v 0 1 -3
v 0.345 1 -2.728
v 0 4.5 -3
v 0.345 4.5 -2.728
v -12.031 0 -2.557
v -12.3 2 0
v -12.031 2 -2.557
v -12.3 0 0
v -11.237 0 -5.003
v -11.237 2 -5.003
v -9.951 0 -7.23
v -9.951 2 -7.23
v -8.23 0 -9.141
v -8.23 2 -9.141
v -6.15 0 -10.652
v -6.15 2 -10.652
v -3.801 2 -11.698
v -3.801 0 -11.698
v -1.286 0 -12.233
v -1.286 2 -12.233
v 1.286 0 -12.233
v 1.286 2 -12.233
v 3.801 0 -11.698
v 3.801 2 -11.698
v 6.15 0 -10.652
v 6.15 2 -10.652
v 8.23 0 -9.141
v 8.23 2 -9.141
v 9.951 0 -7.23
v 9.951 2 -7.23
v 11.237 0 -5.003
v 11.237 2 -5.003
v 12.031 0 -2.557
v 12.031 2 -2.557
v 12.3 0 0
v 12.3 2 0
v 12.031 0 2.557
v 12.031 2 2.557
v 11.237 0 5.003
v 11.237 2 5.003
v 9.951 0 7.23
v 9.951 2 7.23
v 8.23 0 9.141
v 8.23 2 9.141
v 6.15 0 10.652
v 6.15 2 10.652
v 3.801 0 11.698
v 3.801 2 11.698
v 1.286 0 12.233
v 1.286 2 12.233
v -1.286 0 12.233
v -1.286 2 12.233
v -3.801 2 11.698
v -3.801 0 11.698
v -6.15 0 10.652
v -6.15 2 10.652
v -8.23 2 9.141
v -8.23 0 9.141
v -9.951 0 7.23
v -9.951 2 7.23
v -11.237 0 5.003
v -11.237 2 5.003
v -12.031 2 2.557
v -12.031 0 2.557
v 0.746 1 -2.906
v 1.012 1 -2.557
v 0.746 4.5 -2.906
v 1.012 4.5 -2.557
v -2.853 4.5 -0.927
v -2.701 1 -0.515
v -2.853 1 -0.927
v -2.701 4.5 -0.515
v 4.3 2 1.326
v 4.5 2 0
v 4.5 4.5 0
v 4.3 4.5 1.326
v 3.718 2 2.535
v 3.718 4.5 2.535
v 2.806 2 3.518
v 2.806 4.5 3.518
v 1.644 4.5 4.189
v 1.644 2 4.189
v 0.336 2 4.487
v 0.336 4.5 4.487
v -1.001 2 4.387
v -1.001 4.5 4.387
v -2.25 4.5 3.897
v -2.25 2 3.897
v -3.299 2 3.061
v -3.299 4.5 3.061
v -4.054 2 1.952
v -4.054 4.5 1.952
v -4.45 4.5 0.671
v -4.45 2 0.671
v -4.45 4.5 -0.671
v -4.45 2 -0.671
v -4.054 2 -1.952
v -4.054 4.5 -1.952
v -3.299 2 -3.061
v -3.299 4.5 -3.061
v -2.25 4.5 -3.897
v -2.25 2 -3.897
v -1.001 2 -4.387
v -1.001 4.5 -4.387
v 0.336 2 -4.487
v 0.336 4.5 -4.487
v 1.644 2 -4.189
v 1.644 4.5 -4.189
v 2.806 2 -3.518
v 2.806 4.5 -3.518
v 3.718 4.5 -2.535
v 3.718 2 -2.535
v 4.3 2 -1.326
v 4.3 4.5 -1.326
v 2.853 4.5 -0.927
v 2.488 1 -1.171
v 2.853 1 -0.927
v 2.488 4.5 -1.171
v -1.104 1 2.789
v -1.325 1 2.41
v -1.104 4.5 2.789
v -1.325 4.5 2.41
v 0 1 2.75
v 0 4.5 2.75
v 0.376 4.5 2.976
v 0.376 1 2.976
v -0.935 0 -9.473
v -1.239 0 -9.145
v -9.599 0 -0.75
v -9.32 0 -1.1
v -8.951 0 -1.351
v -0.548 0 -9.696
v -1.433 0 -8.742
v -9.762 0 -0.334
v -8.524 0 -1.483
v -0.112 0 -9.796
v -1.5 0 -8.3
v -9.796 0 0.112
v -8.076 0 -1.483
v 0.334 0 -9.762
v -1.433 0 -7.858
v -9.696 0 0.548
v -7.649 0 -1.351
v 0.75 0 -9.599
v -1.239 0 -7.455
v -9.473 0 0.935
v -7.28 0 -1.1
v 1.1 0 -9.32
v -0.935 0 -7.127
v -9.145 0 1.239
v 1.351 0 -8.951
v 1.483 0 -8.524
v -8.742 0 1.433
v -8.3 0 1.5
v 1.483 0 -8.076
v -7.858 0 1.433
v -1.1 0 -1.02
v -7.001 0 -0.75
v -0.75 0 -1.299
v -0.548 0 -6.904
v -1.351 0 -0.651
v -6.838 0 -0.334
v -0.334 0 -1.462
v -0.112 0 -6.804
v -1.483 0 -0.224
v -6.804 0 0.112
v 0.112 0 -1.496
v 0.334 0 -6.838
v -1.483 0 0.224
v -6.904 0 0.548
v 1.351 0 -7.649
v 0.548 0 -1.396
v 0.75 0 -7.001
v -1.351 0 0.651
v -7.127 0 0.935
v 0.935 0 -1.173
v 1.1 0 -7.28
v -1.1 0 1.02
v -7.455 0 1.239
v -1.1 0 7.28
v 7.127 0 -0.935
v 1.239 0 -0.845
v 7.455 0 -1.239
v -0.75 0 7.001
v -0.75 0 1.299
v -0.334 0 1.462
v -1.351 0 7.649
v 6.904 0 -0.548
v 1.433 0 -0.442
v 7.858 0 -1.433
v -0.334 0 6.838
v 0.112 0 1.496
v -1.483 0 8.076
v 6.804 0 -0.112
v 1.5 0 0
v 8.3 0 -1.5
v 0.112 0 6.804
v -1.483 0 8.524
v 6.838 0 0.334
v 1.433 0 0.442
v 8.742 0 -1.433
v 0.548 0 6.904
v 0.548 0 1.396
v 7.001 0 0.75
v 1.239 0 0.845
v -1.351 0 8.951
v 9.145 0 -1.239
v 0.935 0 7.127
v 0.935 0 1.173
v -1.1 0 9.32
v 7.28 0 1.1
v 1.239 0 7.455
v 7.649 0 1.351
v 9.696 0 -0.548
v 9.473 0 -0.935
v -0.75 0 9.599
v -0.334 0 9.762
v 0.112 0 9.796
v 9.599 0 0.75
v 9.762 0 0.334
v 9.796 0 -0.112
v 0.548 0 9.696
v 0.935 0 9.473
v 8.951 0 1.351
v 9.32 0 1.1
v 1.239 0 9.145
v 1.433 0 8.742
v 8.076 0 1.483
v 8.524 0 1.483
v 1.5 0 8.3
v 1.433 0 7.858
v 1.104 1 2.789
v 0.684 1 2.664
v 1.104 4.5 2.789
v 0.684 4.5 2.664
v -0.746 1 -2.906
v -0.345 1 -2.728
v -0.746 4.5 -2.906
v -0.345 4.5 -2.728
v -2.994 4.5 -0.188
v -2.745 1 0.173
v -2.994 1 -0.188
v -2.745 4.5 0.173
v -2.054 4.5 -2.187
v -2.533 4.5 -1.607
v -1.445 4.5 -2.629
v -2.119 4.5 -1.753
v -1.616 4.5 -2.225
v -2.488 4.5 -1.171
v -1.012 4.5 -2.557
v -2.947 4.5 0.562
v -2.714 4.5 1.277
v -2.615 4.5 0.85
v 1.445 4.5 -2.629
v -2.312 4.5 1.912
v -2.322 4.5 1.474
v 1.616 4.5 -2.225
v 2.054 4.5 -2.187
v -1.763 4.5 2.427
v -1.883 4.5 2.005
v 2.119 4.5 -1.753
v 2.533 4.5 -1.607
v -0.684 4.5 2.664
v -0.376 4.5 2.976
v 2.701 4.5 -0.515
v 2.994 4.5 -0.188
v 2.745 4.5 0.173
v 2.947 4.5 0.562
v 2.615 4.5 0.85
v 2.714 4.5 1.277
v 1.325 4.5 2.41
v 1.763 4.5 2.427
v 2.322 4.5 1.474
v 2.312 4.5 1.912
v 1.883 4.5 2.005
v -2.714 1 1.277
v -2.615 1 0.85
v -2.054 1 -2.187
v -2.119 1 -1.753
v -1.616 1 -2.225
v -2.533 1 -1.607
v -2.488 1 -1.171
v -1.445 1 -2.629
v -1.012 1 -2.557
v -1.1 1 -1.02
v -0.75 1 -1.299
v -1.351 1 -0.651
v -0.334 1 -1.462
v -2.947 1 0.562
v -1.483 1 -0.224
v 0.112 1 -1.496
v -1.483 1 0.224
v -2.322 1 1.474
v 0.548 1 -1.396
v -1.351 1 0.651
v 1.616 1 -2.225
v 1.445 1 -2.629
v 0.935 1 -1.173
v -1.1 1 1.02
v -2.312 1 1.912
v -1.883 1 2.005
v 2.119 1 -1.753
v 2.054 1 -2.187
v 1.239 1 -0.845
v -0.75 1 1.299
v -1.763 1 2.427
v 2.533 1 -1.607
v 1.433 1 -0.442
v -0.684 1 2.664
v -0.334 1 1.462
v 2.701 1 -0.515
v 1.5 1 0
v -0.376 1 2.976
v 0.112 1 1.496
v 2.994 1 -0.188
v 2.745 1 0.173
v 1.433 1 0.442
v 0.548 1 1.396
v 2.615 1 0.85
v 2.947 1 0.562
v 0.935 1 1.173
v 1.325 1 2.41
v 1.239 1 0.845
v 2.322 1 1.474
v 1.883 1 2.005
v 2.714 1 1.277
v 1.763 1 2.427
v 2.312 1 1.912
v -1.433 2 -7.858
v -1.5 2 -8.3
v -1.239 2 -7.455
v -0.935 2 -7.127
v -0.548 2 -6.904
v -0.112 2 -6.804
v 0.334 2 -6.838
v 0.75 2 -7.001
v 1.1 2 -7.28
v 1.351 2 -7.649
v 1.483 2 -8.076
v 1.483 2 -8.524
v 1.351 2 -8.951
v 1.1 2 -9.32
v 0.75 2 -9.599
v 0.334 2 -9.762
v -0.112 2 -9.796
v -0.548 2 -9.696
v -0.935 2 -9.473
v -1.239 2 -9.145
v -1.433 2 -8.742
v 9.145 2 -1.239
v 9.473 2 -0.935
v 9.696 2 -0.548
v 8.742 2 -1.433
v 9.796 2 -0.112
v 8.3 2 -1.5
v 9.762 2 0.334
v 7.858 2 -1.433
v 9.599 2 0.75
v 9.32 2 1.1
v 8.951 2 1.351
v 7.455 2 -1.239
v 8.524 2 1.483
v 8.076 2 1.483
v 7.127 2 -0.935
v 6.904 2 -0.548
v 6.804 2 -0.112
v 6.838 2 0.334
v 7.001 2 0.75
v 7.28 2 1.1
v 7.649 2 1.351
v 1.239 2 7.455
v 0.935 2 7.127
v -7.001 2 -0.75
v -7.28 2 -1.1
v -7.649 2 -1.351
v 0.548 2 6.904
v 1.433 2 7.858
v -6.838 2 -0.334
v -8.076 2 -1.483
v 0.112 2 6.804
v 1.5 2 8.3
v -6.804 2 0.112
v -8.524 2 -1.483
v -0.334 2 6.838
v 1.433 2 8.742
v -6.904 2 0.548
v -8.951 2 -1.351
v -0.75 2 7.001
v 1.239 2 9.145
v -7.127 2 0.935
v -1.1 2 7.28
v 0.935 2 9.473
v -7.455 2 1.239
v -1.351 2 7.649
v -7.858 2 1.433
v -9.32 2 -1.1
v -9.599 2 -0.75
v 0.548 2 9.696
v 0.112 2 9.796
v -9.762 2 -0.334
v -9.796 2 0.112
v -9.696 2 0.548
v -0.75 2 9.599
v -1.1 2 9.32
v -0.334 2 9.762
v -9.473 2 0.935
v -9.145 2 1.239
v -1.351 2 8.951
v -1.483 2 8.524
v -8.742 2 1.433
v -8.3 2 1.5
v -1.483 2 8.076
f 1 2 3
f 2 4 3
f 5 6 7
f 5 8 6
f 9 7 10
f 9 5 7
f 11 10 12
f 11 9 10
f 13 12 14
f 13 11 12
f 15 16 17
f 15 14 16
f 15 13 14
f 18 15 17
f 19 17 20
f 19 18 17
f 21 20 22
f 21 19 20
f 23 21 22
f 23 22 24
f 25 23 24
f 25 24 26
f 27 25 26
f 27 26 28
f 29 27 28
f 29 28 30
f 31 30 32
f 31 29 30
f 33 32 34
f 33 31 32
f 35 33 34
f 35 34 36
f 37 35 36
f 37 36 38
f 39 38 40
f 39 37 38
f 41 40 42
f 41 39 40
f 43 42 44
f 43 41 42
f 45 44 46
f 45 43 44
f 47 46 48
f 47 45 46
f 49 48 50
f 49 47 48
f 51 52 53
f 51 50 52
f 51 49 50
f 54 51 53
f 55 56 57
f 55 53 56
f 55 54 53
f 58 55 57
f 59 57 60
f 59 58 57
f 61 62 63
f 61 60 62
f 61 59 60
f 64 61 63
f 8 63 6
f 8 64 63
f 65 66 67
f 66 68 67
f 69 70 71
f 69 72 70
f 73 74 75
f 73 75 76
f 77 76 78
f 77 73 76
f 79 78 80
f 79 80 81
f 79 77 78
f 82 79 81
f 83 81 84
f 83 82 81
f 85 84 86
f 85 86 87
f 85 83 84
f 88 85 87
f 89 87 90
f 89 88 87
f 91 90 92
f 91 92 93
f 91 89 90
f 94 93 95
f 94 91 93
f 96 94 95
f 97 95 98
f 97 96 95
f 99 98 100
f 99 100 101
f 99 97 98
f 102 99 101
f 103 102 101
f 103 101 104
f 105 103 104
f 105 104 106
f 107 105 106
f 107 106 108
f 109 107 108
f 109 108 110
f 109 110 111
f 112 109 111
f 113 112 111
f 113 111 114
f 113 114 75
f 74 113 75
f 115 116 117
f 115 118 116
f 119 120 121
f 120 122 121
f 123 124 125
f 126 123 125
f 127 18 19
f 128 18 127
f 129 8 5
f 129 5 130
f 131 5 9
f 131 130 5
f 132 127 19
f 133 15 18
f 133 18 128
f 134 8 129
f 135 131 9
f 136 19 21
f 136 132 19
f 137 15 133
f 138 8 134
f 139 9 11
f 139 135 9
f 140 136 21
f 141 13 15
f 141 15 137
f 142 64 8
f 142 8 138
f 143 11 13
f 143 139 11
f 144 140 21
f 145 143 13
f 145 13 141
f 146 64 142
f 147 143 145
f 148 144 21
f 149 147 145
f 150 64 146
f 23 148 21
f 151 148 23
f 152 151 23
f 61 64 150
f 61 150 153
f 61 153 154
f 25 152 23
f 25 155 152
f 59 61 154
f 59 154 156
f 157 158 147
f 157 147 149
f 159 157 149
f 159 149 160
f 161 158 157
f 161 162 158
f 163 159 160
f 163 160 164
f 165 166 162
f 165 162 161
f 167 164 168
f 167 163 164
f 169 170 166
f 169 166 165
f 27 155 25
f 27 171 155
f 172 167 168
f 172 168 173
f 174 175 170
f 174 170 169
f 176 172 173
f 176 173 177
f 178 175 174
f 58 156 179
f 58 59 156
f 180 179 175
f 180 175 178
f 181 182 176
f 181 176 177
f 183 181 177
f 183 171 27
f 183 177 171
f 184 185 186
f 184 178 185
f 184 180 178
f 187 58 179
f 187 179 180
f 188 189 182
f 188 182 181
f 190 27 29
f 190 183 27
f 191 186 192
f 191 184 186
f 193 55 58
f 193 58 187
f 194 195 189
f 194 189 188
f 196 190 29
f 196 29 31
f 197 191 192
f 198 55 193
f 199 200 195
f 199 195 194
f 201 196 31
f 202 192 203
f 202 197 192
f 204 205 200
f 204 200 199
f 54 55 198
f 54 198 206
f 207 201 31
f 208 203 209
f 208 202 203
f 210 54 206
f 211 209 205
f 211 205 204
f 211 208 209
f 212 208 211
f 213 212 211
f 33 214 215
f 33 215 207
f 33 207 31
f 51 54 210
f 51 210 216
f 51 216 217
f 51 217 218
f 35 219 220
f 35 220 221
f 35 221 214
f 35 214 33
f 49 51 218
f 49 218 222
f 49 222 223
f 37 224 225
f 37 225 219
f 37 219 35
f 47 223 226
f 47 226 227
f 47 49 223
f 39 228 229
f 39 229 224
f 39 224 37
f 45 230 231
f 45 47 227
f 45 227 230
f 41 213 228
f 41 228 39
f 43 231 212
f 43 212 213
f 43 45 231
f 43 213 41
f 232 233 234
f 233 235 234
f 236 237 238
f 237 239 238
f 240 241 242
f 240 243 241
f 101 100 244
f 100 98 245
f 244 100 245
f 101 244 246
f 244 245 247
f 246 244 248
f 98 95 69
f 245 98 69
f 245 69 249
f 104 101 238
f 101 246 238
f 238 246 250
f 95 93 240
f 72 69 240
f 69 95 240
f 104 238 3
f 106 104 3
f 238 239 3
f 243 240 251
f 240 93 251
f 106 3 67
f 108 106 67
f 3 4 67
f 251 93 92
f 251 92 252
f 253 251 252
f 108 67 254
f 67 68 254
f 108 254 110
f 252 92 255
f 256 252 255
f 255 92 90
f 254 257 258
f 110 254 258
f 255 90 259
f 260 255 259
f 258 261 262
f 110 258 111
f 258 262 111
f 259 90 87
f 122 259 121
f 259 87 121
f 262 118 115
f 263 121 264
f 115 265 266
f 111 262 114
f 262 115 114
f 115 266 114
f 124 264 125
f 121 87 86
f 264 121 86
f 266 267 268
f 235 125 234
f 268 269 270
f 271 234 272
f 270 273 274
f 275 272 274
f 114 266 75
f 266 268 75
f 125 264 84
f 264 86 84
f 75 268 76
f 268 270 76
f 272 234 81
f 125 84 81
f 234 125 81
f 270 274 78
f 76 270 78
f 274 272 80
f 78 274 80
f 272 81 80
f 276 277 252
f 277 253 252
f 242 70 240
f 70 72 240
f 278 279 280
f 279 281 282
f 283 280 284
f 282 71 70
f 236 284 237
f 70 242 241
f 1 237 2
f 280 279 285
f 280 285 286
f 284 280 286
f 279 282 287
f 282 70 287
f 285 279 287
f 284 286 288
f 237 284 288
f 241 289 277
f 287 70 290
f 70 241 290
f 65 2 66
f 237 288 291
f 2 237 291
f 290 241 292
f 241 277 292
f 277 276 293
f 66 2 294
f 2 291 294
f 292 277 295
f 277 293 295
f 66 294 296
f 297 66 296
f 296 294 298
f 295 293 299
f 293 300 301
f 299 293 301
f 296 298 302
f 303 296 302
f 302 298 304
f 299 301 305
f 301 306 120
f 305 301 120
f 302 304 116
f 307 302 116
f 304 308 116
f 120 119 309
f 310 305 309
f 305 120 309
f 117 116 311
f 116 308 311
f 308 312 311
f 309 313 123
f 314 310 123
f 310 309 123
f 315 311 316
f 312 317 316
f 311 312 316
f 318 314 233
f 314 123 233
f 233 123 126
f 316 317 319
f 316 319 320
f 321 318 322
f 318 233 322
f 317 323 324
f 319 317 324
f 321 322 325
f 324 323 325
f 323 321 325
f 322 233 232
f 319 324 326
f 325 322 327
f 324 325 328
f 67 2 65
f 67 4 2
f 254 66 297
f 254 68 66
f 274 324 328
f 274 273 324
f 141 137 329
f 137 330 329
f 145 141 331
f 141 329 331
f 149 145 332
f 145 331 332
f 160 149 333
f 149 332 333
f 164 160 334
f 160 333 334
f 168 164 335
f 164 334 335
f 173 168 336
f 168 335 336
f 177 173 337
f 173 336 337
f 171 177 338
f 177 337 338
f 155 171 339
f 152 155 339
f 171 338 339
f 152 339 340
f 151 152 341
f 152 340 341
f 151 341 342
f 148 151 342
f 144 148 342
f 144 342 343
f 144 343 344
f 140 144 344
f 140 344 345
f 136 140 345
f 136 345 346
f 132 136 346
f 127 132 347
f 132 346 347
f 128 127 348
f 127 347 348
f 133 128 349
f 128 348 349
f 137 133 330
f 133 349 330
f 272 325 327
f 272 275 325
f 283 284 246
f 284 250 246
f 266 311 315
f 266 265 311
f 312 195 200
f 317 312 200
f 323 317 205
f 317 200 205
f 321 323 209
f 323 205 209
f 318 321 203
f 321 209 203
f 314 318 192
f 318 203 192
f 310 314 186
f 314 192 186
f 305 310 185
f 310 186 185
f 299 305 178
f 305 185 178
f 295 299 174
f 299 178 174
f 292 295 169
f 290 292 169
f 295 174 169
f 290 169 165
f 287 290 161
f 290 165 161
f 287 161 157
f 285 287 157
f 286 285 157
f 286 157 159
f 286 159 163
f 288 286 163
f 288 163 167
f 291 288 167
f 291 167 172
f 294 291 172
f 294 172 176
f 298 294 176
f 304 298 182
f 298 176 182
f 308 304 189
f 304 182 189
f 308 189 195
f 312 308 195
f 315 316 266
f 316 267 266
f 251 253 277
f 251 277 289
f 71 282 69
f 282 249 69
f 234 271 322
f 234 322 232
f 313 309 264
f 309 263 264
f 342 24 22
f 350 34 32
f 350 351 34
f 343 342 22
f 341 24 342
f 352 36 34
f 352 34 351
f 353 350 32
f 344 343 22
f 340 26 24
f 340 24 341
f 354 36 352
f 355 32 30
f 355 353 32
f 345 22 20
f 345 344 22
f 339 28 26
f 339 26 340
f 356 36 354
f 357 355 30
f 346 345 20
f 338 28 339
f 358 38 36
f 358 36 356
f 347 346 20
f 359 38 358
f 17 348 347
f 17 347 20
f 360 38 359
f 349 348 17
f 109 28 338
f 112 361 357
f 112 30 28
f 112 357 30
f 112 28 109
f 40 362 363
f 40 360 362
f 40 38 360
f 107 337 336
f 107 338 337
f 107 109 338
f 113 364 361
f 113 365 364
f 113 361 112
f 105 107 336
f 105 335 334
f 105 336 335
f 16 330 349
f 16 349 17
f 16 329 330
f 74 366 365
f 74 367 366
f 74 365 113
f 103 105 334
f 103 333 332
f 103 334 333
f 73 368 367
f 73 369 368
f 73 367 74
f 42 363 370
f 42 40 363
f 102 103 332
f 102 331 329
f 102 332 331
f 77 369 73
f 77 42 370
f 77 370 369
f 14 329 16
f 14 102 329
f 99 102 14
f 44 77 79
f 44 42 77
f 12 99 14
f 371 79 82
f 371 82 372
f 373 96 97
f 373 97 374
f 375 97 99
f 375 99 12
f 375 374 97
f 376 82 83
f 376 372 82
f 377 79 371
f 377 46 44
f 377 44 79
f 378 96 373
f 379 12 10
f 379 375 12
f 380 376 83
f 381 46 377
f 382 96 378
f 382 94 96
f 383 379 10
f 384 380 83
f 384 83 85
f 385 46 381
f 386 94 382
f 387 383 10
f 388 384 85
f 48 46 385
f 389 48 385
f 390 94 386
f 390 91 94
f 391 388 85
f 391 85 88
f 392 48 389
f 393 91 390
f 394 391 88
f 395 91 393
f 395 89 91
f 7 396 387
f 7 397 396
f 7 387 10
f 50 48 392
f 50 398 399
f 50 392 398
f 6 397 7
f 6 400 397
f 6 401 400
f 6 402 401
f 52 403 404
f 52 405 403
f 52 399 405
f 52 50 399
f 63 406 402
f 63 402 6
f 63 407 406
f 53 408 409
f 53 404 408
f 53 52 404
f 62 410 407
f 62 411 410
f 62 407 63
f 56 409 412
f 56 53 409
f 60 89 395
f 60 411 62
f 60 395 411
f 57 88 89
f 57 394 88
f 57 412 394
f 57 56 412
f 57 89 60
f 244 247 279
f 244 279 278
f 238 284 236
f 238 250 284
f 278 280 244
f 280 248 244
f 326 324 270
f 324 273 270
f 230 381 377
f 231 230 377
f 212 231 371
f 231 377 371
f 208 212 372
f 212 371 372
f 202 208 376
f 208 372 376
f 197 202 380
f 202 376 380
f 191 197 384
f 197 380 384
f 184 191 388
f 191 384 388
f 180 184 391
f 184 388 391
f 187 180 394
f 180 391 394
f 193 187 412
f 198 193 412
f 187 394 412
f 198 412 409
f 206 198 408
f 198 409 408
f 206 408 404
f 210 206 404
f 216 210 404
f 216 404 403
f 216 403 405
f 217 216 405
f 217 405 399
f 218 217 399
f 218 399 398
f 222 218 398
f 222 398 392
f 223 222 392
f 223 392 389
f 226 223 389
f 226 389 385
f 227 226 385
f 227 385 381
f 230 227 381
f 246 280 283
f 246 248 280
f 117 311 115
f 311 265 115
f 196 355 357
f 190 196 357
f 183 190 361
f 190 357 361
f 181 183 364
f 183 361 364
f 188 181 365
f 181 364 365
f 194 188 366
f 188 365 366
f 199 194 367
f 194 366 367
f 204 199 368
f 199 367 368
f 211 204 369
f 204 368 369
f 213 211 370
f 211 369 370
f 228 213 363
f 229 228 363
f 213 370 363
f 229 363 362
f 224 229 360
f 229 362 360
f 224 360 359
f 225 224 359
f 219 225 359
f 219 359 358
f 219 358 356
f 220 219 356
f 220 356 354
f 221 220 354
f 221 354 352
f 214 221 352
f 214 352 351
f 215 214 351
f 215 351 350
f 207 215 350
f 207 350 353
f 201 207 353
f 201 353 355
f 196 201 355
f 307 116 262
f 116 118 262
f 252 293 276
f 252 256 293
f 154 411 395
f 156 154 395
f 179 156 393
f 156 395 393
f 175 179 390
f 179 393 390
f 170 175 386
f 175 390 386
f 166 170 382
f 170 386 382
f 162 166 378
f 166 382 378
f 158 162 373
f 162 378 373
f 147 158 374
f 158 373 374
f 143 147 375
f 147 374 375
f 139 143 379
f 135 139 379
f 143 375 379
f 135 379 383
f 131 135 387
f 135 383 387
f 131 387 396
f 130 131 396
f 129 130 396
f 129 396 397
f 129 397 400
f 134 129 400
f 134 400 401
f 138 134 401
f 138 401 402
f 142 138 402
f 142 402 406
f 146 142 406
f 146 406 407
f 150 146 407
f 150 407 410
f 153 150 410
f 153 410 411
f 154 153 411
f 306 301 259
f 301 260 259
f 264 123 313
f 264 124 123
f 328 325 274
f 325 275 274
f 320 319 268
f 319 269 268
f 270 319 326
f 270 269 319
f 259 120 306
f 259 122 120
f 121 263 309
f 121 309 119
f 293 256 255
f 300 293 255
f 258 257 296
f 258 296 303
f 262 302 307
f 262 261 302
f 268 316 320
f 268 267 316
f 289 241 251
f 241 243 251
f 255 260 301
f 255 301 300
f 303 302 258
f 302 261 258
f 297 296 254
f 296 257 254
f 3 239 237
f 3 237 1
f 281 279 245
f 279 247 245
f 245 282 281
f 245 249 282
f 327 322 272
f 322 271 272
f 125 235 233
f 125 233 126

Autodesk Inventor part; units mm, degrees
ref_plane "YZ Plane" through (0, 0, 0) normal (1, 0, 0) x (0, 1, 0)
ref_plane "XZ Plane" through (0, 0, 0) normal (0, 1, 0) x (-1, 0, 0)
ref_plane "XY Plane" through (0, 0, 0) normal (0, 0, 1) x (1, 0, 0)
sketch "Sketch1" plane through (0, 0, 0) normal (0, 1, 0) x (-1, 0, 0)
  circle A0 centre (0, 0) radius 12.3
  circle A1 centre (0, 0) radius 4.5
  circle A2 centre (0, 0) radius 2.75
  circle A3 centre (0, 0) radius 1.5
  dimension "d0" = 24.6
  dimension "d1" = 9
  dimension "d2" = 5.5
  dimension "d3" = 3
extrude "Extrusion1" add sketch "Sketch1" along normal blind 2 contours A0
sketch "Sketch2" plane through (0, 0, 0) normal (0, -1, 0) x (1, 0, 0)
  circle A0 centre (0, 0) radius 10
  circle A1 centre (0, 0) radius 4.5
  circle A2 centre (0, 0) radius 2.75
  circle A3 centre (0, 0) radius 1.5
  dimension "d6" = 20
  dimension "d7" = 9
  dimension "d8" = 5.5
  dimension "d9" = 3
extrude "Extrusion2" add sketch "Sketch2" against normal blind 4.5 contours A1
sketch "Sketch3" plane through (0, 0, 0) normal (0, -1, 0) x (1, 0, 0)
  circle A0 centre (0, 0) radius 10
  circle A1 centre (0, 0) radius 4.5
  circle A2 centre (0, 0) radius 2.75
  circle A3 centre (0, 0) radius 1.5
  dimension "d12" = 20
  dimension "d13" = 9
  dimension "d14" = 5.5
  dimension "d15" = 3
extrude "Extrusion3" add sketch "Sketch3" against normal blind 1 contours A2
sketch "Sketch4" plane through (0, 4.5, 0) normal (0, 1, 0) x (1, 0, 0)
  circle A0 centre (0, 0) radius 8.3 construction
  line L0 (0, 0) -> (0, -8.3) construction
  circle A1 centre (0, -8.3) radius 1.5
  dimension "d18" = 16.6
  dimension "d19" = 3
extrude "Extrusion4" cut sketch "Sketch4" against normal up to next
pattern_circular "Circular Pattern1" count 4 over 360 about axis through (0, 0, 0) along (0, 1, 0) of "Extrusion4"
sketch "Sketch5" plane through (0, 4.5, 0) normal (0, 1, 0) x (1, 0, 0)
  circle A0 centre (0, 0) radius 1.5 projected
  circle A1 centre (0, 0) radius 3 construction
  line L0 (0, 0) -> (0, -3) construction
  line L1 (0, 0) -> (-0.376, -2.9763) construction
  line L2 (0, 0) -> (-0.7461, -2.9057) construction
  circle A2 centre (0, 0) radius 2.75 projected
  line L3 (0, -2.75) -> (-0.376, -2.9763)
  line L4 (-0.6839, -2.6636) -> (-0.376, -2.9763)
  arc A3 (-0.6839, -2.6636) -> (0, -2.75) centre (0, 0) ccw
  dimension "d25" = 6
  dimension "d26" = 7.2
  dimension "d27" = 14.4
extrude "Extrusion5" cut sketch "Sketch5" against normal up to surface (3.5 mm away) contours A2 L3 L4
pattern_circular "Circular Pattern2" count 25 over 360 about axis through (0, 0, 0) along (0, 1, 0) of "Extrusion5"
properties part number "Horn"
